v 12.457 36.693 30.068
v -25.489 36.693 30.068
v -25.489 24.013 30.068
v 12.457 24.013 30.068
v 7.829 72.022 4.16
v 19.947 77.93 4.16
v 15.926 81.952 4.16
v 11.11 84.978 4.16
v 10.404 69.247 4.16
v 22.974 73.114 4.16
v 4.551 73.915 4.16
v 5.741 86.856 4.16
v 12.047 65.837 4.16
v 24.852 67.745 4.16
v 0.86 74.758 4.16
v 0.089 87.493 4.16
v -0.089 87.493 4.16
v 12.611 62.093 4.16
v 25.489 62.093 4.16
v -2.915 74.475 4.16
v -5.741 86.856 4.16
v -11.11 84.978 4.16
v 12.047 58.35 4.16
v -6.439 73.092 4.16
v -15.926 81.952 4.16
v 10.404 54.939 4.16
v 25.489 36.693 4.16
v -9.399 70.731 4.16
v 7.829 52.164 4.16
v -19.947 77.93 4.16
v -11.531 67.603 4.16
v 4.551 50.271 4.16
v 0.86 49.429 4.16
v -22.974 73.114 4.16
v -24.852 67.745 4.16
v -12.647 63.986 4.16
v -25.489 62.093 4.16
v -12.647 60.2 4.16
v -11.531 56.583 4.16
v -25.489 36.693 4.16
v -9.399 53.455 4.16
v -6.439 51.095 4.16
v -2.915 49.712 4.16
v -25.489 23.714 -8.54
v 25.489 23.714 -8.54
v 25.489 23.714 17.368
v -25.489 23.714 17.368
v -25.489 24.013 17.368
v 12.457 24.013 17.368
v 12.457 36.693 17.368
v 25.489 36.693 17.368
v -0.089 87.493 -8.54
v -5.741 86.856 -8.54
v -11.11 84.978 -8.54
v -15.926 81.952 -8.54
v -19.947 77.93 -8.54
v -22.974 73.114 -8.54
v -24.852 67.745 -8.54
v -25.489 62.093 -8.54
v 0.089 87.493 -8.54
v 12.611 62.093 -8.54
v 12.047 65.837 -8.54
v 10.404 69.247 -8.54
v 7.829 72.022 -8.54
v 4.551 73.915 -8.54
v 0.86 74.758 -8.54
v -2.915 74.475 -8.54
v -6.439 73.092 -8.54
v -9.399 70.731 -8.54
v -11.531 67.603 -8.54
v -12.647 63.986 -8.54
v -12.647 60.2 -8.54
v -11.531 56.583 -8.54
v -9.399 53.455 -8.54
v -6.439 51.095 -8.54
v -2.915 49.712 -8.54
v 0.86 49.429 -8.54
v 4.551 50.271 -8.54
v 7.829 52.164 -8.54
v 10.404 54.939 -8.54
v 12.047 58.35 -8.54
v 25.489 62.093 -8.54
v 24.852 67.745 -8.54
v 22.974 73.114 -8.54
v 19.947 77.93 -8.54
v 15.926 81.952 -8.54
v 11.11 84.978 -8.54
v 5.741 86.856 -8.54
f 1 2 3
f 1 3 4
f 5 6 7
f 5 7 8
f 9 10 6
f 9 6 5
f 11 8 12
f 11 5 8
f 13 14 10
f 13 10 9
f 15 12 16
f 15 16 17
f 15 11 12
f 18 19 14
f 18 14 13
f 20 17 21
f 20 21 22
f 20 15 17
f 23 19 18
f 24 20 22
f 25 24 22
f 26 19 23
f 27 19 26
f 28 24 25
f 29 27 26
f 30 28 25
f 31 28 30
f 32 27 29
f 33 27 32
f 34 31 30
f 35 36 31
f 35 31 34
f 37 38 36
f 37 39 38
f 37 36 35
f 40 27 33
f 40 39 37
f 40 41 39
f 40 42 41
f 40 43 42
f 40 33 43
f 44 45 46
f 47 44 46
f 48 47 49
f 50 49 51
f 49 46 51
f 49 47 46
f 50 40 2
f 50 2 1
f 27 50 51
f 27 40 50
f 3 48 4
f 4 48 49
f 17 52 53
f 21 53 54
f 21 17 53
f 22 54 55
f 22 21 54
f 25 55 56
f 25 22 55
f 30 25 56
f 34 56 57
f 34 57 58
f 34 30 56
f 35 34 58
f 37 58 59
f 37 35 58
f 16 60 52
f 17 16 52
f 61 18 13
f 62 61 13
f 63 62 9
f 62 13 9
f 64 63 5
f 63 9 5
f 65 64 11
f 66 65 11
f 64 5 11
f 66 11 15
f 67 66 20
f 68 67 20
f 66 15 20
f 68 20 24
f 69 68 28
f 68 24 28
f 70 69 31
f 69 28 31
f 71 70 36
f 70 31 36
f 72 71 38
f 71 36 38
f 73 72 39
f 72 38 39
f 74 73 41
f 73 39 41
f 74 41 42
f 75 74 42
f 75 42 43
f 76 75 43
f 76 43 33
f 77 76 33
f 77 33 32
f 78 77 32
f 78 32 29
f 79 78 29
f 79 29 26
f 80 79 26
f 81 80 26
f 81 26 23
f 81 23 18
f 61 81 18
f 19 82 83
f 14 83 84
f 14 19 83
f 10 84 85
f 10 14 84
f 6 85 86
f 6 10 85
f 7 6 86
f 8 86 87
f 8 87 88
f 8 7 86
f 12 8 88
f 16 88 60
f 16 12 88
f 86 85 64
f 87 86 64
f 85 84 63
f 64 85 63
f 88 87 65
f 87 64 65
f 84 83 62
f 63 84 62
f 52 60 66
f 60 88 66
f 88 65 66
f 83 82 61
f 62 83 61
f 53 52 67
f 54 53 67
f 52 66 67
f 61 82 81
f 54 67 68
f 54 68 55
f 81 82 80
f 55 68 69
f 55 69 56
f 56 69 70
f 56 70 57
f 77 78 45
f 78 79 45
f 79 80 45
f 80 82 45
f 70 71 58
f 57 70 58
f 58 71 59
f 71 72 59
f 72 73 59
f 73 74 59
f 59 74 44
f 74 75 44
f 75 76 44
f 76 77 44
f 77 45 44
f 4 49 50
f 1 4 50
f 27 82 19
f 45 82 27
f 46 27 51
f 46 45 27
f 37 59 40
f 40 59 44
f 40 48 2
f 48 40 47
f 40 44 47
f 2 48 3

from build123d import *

# Parameters (mm, degrees)
F0_W      = 12.9794
F0_H      = 25.908
F1_DEPTH  = 25.4889
F2_W      = 38.1
F2_H      = 12.7
F3_DEPTH  = 6.35
F6_W      = 37.945812
F6_H      = 12.68057
F7_DEPTH  = 12.7
F8_W      = 50.9778
F8_H      = 12.7
F9_DEPTH  = 50.8
F10_R     = 12.7
F11_DEPTH = 12.701
F12_R     = 25.4


with BuildPart() as f1:
    # F0 (on Right) → F1 (new body, symmetric)
    with BuildSketch(Plane.YZ):
        with Locations((30.203413, 4.414101)):
            Rectangle(F0_W, F0_H)
    extrude(amount=F1_DEPTH, both=True)

    # F6 (on face) → F7 (join)
    with BuildSketch(Plane.XY.offset(17.368101)):
        with Locations((-6.515994, 30.352828)):
            Rectangle(F6_W, F6_H)
    extrude(amount=F7_DEPTH)

    # F8 (on face) → F9 (join)
    with BuildSketch(Plane(origin=(0, 36.693113, 0), x_dir=(-1, 0, 0), z_dir=(0, 1, 0))):
        with Locations((0, -2.189899)):
            Rectangle(F8_W, F8_H)
    extrude(amount=F9_DEPTH)

    # F10 (on face) → F11 (cut, through all)
    with BuildSketch(Plane.XY.offset(4.160101)):
        with Locations((-0.0889, 62.093113)):
            Circle(F10_R)
    extrude(amount=-F11_DEPTH, mode=Mode.SUBTRACT)

    # F12
    f12_edges = [f1.edges().sort_by_distance(p)[0] for p in [
        (-25.4889, 87.493113, -2.189899),
        (25.4889, 87.493113, -2.189899),
    ]]
    fillet(f12_edges, radius=F12_R)


with BuildPart() as f3:
    # F2 (on Front) → F3 (new body, symmetric)
    with BuildSketch(Plane.XZ):
        with Locations((6.389182, 23.830109)):
            Rectangle(F2_W, F2_H)
    extrude(amount=F3_DEPTH, both=True)


solid = f1.part
